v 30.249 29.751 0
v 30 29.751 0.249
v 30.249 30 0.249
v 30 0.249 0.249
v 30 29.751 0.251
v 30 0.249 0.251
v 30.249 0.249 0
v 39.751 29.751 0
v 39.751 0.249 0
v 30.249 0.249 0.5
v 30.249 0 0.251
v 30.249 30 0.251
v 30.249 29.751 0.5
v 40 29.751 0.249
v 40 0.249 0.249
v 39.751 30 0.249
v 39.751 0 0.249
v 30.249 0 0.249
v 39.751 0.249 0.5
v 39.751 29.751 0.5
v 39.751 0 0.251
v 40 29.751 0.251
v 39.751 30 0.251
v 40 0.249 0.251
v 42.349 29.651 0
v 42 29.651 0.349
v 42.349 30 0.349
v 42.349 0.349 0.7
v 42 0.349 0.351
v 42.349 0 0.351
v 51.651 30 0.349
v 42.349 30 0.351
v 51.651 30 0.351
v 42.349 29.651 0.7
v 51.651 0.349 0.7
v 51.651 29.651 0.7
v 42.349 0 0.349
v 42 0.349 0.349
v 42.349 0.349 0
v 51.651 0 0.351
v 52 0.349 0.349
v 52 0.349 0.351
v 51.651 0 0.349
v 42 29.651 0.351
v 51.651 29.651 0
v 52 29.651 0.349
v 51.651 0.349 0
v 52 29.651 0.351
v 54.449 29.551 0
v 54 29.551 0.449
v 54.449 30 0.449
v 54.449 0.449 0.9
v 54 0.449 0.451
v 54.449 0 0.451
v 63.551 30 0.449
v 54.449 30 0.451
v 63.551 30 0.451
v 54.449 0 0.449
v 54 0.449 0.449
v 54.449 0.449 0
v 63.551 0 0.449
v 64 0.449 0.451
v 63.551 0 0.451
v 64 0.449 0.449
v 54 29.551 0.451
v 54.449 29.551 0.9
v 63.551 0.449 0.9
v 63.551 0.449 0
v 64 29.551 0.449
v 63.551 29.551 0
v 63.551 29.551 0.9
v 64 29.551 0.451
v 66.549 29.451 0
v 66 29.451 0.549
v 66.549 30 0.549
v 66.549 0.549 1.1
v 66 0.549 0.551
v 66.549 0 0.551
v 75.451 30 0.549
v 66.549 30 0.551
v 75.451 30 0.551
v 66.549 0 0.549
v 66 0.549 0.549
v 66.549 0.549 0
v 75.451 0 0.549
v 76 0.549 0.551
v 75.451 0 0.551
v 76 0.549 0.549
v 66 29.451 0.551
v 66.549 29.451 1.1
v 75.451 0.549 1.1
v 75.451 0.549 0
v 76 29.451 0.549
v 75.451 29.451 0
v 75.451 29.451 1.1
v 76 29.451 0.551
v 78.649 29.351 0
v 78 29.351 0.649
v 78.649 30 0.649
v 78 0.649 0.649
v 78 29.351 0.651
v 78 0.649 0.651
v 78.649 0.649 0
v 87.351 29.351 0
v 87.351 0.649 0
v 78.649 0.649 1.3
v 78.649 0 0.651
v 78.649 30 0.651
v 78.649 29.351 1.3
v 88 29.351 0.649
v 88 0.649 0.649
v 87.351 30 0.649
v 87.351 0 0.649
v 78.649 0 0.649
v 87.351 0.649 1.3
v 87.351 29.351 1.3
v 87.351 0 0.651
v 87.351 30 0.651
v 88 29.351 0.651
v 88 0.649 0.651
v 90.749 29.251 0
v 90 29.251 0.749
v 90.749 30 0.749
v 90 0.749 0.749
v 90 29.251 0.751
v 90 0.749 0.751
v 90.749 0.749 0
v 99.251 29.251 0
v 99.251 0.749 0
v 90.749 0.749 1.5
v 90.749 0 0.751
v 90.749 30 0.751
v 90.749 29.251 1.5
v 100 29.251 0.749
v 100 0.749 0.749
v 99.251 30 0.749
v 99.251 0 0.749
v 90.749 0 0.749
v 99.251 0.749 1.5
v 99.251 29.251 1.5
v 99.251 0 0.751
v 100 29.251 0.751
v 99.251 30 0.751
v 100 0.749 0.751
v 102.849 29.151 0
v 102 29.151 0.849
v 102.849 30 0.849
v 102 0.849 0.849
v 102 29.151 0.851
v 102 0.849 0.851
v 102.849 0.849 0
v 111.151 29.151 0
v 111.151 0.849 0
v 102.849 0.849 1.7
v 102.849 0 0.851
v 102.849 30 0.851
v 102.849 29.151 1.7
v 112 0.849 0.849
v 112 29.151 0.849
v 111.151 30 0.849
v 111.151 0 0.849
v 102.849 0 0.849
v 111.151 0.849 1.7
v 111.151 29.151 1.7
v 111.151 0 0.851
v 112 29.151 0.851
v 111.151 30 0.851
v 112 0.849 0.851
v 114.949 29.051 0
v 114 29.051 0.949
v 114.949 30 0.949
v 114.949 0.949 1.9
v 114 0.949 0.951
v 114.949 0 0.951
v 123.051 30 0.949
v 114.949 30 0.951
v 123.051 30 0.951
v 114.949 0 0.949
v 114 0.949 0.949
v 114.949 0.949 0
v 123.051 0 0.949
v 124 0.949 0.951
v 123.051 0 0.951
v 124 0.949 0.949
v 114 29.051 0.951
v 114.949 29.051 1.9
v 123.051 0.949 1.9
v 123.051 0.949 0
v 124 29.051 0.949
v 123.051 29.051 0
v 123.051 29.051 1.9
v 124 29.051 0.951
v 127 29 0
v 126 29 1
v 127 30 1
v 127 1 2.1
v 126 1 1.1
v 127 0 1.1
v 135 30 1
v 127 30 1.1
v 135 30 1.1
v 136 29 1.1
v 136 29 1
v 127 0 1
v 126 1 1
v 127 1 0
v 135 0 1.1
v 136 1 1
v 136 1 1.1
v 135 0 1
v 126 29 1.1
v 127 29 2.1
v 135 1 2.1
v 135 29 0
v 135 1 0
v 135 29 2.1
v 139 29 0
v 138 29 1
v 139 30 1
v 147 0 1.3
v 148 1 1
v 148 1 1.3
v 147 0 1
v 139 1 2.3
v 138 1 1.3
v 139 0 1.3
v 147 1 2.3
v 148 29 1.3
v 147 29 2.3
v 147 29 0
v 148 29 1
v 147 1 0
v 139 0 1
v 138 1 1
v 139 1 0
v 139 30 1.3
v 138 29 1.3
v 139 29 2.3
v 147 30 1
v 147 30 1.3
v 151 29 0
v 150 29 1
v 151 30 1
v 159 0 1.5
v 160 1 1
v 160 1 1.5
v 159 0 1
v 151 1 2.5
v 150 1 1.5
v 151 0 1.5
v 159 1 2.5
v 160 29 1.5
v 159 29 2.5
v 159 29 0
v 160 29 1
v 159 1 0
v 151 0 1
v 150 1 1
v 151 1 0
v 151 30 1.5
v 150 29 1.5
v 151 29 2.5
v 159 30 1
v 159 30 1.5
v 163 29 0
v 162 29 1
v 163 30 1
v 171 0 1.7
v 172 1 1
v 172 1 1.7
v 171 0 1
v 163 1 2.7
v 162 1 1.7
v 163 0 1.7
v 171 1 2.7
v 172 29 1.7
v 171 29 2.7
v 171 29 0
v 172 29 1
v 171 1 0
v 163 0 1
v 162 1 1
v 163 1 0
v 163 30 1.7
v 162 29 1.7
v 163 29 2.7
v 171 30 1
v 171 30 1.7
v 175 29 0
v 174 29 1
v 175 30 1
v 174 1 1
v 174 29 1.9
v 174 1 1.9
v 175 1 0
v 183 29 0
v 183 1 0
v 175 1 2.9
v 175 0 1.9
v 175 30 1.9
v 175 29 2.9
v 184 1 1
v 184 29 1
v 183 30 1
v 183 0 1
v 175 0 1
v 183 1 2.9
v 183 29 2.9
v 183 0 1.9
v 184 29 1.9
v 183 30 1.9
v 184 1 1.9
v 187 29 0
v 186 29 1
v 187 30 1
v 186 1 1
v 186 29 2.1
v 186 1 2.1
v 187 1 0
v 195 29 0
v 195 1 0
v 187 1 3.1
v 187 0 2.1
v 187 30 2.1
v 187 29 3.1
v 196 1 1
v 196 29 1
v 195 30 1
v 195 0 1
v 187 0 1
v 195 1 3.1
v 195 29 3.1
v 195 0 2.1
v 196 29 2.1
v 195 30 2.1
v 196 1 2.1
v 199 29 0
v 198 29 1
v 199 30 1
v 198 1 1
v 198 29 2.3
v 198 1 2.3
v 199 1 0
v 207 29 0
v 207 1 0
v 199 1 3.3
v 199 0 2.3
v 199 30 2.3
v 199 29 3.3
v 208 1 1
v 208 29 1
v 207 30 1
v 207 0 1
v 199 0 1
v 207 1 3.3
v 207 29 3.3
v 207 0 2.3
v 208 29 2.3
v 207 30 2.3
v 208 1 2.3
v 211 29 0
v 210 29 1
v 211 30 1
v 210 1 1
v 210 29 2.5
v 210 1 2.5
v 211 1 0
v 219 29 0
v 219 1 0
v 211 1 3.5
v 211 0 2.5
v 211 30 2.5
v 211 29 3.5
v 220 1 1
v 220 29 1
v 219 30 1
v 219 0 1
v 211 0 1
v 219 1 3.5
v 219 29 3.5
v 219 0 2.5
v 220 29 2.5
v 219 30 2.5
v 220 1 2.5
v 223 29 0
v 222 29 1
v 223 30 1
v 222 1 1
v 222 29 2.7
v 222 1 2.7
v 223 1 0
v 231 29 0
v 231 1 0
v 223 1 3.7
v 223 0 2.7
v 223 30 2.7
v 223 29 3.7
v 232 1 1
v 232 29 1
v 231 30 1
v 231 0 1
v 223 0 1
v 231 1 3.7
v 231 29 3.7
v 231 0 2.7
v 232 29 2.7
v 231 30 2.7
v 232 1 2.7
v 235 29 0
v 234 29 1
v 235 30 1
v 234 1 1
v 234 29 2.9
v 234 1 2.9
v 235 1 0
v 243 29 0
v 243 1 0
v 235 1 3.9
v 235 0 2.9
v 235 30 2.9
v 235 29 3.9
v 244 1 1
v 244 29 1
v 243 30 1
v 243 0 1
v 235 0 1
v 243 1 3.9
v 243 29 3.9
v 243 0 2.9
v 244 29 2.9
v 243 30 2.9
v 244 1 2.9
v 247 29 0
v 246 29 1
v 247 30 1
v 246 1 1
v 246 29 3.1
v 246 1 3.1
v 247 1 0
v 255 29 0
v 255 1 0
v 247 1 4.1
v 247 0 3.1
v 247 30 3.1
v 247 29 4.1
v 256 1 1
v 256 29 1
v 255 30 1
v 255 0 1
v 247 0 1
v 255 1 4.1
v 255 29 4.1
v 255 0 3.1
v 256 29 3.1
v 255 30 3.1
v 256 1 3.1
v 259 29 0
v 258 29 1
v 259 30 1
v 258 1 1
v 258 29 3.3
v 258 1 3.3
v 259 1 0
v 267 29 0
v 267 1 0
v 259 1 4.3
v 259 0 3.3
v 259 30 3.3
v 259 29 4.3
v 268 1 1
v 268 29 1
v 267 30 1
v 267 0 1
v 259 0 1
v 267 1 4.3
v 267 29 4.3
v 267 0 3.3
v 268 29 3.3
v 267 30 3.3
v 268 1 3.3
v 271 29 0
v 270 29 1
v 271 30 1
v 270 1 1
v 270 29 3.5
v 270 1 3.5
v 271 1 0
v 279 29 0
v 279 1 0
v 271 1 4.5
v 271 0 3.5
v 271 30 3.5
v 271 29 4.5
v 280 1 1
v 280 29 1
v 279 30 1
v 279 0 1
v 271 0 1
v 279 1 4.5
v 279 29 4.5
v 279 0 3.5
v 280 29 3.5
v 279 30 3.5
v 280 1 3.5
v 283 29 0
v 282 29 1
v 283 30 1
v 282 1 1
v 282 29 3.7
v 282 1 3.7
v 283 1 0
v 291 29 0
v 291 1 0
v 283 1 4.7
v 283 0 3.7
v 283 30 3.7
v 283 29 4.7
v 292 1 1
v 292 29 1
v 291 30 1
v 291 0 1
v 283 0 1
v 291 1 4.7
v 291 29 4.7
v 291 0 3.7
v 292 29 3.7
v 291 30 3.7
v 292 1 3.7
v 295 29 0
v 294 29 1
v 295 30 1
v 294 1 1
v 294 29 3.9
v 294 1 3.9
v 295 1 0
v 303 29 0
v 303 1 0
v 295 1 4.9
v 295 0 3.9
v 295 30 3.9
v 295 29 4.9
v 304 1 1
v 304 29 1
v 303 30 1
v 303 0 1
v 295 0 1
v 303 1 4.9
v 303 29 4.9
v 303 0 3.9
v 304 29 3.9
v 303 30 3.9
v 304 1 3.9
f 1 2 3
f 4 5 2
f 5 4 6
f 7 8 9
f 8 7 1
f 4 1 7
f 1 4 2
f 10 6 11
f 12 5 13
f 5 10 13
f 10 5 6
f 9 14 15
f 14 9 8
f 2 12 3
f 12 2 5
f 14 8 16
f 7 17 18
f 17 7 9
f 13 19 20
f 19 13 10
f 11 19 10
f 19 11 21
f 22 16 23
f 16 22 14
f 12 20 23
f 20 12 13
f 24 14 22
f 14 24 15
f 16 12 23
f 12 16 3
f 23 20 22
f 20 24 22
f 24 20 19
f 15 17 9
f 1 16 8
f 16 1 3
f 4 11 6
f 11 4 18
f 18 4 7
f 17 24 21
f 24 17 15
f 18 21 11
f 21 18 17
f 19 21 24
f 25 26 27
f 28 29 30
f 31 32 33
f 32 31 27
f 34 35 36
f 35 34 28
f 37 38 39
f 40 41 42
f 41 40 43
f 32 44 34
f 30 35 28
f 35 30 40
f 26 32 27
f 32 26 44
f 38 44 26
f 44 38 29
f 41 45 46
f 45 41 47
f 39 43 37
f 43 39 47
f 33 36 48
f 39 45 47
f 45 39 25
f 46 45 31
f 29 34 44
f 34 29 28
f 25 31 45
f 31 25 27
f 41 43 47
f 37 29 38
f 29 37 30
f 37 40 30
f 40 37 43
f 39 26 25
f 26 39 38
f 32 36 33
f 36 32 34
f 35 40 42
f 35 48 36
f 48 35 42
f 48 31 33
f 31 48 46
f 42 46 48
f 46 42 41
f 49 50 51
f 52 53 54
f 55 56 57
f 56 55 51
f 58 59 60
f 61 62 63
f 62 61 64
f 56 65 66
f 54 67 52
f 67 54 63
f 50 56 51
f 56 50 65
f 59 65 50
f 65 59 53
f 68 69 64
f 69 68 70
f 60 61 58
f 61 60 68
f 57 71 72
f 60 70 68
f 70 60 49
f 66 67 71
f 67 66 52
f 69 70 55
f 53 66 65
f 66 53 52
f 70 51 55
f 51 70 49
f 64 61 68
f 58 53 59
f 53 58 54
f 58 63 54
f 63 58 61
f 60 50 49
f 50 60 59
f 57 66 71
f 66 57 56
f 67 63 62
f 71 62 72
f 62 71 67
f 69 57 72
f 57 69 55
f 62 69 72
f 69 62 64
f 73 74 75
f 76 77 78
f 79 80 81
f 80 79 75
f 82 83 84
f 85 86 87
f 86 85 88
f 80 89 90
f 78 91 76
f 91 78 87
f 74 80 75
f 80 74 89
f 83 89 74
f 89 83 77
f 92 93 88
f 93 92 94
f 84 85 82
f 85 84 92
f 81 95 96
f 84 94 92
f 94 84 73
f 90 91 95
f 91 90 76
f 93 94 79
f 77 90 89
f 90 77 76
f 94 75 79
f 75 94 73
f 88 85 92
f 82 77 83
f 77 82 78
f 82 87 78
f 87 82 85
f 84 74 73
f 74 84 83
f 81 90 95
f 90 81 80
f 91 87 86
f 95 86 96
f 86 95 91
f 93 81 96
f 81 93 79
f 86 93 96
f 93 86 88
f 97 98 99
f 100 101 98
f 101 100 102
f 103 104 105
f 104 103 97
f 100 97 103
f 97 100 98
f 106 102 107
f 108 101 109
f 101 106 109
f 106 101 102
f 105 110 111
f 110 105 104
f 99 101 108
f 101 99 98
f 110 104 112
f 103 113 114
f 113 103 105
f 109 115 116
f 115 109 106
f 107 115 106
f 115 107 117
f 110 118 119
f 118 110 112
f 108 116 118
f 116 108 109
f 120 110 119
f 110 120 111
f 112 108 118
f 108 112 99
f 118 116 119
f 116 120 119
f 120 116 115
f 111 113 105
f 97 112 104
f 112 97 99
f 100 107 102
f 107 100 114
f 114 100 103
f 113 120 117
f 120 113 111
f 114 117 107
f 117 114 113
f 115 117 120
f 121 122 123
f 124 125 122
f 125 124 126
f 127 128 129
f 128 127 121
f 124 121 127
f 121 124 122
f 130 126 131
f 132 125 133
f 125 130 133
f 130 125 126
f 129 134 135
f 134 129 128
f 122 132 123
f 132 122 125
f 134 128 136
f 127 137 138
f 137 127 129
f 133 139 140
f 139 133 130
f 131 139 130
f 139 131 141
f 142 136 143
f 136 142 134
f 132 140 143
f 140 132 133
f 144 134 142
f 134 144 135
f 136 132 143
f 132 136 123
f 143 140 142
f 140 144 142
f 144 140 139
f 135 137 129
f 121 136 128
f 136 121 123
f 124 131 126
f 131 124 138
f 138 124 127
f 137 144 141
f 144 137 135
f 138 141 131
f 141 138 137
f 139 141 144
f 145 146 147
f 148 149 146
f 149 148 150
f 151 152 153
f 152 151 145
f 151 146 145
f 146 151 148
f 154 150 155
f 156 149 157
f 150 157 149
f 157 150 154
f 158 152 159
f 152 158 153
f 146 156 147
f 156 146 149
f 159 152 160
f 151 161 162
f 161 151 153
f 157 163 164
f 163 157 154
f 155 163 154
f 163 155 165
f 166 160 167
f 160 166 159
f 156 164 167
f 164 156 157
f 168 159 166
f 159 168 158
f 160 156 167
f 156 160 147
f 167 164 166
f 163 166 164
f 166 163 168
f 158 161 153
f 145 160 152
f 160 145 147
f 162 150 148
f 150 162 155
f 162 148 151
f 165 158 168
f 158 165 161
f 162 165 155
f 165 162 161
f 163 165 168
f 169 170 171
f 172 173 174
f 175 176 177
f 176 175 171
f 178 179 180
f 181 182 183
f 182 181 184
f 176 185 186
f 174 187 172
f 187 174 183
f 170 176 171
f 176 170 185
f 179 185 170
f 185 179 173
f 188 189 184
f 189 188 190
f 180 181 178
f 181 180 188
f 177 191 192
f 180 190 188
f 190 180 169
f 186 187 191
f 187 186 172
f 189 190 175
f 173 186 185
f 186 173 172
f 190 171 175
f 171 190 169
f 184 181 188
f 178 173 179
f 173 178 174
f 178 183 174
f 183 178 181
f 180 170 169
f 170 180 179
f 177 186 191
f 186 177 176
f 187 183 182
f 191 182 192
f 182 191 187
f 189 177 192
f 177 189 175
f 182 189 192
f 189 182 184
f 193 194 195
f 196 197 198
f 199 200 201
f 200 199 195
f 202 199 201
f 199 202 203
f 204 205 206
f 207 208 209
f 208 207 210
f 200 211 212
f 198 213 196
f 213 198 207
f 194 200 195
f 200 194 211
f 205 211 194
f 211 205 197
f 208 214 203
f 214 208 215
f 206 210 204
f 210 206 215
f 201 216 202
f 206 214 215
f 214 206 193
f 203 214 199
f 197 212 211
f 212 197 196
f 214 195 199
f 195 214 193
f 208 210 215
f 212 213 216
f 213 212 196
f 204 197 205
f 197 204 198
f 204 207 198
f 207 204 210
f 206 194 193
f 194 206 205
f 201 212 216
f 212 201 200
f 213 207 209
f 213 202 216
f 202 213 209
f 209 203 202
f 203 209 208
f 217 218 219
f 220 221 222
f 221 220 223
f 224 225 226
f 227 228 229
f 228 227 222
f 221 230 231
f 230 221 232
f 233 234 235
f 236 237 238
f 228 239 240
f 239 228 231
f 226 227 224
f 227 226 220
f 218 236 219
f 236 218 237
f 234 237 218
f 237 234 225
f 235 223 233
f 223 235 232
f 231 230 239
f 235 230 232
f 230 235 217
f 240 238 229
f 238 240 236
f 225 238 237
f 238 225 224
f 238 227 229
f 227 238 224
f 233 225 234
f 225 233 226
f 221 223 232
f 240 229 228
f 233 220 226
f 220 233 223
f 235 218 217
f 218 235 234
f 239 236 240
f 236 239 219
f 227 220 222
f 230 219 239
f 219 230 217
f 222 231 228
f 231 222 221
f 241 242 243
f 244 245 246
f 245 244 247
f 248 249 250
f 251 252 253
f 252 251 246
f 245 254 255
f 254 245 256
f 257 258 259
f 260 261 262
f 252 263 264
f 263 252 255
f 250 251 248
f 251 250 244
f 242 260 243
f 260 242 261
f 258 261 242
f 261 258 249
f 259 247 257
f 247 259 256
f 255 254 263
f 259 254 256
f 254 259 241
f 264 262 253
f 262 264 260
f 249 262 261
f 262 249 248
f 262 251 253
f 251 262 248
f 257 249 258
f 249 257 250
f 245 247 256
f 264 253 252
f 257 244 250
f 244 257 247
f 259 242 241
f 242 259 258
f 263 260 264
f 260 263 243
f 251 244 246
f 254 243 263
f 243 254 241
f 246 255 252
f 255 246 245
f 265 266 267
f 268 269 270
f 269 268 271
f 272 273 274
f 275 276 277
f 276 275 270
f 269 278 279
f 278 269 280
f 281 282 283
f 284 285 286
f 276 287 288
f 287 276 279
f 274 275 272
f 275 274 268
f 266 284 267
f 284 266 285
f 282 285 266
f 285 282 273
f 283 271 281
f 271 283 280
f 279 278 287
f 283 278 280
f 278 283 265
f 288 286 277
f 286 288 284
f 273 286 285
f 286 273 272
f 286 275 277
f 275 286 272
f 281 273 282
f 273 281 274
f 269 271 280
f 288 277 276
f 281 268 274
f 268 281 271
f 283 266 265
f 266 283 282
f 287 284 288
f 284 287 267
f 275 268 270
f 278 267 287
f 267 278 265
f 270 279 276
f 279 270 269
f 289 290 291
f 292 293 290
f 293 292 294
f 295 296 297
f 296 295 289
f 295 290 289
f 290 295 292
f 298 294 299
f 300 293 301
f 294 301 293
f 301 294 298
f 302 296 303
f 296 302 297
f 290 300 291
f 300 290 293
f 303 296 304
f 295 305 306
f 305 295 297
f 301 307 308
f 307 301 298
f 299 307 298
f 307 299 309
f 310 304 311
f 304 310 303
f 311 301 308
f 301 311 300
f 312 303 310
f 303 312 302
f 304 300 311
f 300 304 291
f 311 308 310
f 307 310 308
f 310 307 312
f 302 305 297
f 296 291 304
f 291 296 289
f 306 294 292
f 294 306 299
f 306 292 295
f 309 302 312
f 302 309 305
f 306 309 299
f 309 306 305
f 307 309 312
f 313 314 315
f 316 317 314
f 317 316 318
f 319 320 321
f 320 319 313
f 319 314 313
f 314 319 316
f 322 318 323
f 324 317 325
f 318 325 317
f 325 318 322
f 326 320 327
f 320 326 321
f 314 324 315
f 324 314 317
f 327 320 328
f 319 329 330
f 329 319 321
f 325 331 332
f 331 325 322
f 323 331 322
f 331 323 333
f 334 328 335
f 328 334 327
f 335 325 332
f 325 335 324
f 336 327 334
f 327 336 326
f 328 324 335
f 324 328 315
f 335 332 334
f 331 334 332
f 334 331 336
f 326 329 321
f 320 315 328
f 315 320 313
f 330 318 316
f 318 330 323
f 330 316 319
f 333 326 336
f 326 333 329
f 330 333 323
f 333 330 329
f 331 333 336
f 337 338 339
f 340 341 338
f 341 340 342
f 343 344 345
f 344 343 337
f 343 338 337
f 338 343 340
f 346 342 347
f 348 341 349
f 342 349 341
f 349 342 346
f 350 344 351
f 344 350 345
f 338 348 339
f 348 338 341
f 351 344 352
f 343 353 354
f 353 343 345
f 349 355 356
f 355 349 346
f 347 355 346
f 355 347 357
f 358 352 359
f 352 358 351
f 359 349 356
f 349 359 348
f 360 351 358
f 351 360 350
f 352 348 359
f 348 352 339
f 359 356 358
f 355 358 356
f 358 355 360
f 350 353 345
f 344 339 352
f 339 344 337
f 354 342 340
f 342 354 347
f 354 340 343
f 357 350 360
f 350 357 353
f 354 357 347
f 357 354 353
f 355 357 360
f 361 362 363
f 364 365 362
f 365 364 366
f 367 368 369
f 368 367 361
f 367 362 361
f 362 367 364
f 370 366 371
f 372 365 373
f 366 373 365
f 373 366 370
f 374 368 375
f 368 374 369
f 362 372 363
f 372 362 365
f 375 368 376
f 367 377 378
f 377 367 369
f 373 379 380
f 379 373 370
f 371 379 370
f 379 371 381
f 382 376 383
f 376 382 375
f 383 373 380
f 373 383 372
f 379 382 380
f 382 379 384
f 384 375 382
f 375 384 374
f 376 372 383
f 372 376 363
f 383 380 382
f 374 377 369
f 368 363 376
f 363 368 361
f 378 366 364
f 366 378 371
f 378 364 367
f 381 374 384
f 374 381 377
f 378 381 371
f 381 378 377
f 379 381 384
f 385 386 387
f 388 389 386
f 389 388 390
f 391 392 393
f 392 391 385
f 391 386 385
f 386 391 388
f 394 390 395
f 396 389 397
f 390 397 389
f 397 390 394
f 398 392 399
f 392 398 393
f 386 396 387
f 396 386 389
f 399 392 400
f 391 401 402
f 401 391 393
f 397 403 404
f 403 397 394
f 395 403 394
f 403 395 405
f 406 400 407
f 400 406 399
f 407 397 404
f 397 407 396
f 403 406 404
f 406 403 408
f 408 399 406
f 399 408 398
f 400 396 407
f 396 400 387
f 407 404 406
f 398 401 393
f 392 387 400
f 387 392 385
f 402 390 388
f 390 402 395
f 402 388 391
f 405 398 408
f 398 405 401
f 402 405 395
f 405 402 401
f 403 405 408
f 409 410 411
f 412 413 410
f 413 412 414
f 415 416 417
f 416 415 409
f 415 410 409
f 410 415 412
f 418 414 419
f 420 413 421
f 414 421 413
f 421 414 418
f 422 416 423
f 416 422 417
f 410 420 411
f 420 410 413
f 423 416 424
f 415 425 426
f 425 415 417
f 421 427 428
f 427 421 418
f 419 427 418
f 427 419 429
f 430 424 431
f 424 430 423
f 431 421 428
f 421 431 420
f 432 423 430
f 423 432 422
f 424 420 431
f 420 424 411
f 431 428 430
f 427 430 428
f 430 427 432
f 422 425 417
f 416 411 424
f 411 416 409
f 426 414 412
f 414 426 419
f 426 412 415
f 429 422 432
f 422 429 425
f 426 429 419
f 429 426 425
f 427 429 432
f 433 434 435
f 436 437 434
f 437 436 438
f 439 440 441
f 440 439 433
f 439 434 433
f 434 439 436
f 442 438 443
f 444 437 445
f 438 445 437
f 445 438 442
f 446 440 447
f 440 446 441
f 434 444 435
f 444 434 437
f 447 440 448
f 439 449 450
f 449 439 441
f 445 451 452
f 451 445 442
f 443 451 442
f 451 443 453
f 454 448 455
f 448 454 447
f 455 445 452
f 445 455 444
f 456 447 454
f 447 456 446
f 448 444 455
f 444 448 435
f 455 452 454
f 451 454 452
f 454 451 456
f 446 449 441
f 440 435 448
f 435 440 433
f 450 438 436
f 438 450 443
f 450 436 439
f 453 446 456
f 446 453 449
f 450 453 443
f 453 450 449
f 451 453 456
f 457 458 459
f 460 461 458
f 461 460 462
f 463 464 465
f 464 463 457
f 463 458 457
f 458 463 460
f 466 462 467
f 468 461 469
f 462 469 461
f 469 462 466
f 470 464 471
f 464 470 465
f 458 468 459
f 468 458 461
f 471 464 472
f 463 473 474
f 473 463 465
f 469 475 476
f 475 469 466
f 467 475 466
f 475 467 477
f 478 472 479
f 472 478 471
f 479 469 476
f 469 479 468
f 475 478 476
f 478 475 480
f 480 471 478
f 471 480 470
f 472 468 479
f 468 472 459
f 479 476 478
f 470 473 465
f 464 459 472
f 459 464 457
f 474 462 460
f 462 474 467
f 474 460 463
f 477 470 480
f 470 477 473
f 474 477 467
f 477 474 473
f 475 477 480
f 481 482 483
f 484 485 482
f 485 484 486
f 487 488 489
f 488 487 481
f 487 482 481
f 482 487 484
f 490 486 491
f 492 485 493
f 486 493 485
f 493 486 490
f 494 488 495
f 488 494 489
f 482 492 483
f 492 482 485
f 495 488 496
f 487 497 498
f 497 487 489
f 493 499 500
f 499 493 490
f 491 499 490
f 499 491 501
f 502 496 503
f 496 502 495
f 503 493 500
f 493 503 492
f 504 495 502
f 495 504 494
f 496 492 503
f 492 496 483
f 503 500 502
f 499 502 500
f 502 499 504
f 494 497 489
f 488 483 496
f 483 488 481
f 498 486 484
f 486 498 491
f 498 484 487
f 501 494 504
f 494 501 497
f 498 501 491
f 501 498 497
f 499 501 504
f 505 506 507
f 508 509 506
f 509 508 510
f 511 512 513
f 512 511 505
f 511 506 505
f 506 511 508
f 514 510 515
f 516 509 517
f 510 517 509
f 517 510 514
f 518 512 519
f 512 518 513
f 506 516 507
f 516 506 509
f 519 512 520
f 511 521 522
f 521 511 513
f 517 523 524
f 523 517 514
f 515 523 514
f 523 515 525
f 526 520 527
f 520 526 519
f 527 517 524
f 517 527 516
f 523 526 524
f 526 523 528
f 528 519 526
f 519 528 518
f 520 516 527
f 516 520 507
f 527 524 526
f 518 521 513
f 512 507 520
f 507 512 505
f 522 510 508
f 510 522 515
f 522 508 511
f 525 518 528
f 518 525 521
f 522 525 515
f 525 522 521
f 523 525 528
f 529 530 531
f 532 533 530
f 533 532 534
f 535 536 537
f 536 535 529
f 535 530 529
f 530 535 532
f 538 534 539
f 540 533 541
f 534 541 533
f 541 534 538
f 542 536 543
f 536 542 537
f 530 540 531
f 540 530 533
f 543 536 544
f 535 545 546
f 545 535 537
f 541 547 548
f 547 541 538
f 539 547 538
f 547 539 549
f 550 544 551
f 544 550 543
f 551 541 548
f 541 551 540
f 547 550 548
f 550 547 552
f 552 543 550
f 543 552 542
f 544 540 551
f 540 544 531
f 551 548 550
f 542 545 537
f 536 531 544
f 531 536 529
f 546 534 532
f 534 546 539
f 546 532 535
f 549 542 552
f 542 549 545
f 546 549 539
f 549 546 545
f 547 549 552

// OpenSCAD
// use <box.scad>

module roundedBox(box, c = 1, fn = 10) {
    translate([c, c, c])
    minkowski() {
        cube(box - [2*c, 2*c, 2*c]);
        sphere(r=c, $fn = fn);
    }
}


module chamferBox(box, d = 1, fn = 4) {
    cc = min(box);
    c = min(cc/2 - 0.001, d);
    translate([c, c, c])
    minkowski() {
        cube(box - [2*c, 2*c, 2*c]);
    
        union() {
            cylinder(h=c, r1=c, r2=0, $fn = fn);
            scale(-1) cylinder(h=c, r1=c, r2=0, $fn = fn);
        }
    }
}

module roundedChamferBox(box, r = 1, c = 1) {
    assert(r > c);
    assert(box[0] > 2*r);
    c = max(0.001, c);

    translate([r, r, c])
    minkowski() {
        minkowski() {
            cube(box - [2*r, 2*r, 3*c]);
            cylinder(h=c, r=r - c);
        }
        
        union() {
            cylinder(h=c, r1=c, r2=0);
            scale(-1) cylinder(h=c, r1=c, r2=0);
        }
    }
}


//roundedChamferBox([10, 20, 15], 3, 1, $fn=60);
//chamferBox([10, 20, 15], 1, 4);
//roundedBox([10, 20, 15], 1, 30);
//cube([10, 20, 15]);

for (z = [0.5:0.2:5]) {
    translate([z * 60, 0, 0]) chamferBox([10, 30, z], 1, 4);
}
